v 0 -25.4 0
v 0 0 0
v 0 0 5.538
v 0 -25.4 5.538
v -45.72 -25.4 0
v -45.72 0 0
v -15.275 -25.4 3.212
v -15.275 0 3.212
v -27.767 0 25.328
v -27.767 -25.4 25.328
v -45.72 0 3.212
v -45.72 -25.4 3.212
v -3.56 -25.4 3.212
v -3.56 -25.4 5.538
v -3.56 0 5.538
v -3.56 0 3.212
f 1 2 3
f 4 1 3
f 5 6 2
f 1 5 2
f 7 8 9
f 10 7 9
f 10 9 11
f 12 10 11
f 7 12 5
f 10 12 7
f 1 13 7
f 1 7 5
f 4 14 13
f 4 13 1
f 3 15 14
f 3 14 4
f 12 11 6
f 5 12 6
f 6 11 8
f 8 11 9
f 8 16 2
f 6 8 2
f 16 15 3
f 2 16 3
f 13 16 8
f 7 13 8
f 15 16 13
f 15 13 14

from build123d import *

# Parameters (mm, degrees)
F0_W     = 3.5603952128
F0_H     = 2.3265234751
F1_DEPTH = 25.4


with BuildPart() as f1:
    # F0 (on Front) → F1 (new body)
    with BuildSketch(Plane.XZ):
        Polygon((-45.72, 0), (0, 0), (0, 3.2118688712), (-3.5603952128, 3.2118688712), (-15.2750396183, 3.2118688712), (-45.72, 3.2118688712), align=None)
        with Locations((-1.7801976064, 4.3751306088)):
            Rectangle(F0_W, F0_H)
        Polygon((-27.766545563, 25.327977915), (-45.72, 3.2118688712), (-15.2750396183, 3.2118688712), align=None)
    extrude(amount=F1_DEPTH)


solid = f1.part
